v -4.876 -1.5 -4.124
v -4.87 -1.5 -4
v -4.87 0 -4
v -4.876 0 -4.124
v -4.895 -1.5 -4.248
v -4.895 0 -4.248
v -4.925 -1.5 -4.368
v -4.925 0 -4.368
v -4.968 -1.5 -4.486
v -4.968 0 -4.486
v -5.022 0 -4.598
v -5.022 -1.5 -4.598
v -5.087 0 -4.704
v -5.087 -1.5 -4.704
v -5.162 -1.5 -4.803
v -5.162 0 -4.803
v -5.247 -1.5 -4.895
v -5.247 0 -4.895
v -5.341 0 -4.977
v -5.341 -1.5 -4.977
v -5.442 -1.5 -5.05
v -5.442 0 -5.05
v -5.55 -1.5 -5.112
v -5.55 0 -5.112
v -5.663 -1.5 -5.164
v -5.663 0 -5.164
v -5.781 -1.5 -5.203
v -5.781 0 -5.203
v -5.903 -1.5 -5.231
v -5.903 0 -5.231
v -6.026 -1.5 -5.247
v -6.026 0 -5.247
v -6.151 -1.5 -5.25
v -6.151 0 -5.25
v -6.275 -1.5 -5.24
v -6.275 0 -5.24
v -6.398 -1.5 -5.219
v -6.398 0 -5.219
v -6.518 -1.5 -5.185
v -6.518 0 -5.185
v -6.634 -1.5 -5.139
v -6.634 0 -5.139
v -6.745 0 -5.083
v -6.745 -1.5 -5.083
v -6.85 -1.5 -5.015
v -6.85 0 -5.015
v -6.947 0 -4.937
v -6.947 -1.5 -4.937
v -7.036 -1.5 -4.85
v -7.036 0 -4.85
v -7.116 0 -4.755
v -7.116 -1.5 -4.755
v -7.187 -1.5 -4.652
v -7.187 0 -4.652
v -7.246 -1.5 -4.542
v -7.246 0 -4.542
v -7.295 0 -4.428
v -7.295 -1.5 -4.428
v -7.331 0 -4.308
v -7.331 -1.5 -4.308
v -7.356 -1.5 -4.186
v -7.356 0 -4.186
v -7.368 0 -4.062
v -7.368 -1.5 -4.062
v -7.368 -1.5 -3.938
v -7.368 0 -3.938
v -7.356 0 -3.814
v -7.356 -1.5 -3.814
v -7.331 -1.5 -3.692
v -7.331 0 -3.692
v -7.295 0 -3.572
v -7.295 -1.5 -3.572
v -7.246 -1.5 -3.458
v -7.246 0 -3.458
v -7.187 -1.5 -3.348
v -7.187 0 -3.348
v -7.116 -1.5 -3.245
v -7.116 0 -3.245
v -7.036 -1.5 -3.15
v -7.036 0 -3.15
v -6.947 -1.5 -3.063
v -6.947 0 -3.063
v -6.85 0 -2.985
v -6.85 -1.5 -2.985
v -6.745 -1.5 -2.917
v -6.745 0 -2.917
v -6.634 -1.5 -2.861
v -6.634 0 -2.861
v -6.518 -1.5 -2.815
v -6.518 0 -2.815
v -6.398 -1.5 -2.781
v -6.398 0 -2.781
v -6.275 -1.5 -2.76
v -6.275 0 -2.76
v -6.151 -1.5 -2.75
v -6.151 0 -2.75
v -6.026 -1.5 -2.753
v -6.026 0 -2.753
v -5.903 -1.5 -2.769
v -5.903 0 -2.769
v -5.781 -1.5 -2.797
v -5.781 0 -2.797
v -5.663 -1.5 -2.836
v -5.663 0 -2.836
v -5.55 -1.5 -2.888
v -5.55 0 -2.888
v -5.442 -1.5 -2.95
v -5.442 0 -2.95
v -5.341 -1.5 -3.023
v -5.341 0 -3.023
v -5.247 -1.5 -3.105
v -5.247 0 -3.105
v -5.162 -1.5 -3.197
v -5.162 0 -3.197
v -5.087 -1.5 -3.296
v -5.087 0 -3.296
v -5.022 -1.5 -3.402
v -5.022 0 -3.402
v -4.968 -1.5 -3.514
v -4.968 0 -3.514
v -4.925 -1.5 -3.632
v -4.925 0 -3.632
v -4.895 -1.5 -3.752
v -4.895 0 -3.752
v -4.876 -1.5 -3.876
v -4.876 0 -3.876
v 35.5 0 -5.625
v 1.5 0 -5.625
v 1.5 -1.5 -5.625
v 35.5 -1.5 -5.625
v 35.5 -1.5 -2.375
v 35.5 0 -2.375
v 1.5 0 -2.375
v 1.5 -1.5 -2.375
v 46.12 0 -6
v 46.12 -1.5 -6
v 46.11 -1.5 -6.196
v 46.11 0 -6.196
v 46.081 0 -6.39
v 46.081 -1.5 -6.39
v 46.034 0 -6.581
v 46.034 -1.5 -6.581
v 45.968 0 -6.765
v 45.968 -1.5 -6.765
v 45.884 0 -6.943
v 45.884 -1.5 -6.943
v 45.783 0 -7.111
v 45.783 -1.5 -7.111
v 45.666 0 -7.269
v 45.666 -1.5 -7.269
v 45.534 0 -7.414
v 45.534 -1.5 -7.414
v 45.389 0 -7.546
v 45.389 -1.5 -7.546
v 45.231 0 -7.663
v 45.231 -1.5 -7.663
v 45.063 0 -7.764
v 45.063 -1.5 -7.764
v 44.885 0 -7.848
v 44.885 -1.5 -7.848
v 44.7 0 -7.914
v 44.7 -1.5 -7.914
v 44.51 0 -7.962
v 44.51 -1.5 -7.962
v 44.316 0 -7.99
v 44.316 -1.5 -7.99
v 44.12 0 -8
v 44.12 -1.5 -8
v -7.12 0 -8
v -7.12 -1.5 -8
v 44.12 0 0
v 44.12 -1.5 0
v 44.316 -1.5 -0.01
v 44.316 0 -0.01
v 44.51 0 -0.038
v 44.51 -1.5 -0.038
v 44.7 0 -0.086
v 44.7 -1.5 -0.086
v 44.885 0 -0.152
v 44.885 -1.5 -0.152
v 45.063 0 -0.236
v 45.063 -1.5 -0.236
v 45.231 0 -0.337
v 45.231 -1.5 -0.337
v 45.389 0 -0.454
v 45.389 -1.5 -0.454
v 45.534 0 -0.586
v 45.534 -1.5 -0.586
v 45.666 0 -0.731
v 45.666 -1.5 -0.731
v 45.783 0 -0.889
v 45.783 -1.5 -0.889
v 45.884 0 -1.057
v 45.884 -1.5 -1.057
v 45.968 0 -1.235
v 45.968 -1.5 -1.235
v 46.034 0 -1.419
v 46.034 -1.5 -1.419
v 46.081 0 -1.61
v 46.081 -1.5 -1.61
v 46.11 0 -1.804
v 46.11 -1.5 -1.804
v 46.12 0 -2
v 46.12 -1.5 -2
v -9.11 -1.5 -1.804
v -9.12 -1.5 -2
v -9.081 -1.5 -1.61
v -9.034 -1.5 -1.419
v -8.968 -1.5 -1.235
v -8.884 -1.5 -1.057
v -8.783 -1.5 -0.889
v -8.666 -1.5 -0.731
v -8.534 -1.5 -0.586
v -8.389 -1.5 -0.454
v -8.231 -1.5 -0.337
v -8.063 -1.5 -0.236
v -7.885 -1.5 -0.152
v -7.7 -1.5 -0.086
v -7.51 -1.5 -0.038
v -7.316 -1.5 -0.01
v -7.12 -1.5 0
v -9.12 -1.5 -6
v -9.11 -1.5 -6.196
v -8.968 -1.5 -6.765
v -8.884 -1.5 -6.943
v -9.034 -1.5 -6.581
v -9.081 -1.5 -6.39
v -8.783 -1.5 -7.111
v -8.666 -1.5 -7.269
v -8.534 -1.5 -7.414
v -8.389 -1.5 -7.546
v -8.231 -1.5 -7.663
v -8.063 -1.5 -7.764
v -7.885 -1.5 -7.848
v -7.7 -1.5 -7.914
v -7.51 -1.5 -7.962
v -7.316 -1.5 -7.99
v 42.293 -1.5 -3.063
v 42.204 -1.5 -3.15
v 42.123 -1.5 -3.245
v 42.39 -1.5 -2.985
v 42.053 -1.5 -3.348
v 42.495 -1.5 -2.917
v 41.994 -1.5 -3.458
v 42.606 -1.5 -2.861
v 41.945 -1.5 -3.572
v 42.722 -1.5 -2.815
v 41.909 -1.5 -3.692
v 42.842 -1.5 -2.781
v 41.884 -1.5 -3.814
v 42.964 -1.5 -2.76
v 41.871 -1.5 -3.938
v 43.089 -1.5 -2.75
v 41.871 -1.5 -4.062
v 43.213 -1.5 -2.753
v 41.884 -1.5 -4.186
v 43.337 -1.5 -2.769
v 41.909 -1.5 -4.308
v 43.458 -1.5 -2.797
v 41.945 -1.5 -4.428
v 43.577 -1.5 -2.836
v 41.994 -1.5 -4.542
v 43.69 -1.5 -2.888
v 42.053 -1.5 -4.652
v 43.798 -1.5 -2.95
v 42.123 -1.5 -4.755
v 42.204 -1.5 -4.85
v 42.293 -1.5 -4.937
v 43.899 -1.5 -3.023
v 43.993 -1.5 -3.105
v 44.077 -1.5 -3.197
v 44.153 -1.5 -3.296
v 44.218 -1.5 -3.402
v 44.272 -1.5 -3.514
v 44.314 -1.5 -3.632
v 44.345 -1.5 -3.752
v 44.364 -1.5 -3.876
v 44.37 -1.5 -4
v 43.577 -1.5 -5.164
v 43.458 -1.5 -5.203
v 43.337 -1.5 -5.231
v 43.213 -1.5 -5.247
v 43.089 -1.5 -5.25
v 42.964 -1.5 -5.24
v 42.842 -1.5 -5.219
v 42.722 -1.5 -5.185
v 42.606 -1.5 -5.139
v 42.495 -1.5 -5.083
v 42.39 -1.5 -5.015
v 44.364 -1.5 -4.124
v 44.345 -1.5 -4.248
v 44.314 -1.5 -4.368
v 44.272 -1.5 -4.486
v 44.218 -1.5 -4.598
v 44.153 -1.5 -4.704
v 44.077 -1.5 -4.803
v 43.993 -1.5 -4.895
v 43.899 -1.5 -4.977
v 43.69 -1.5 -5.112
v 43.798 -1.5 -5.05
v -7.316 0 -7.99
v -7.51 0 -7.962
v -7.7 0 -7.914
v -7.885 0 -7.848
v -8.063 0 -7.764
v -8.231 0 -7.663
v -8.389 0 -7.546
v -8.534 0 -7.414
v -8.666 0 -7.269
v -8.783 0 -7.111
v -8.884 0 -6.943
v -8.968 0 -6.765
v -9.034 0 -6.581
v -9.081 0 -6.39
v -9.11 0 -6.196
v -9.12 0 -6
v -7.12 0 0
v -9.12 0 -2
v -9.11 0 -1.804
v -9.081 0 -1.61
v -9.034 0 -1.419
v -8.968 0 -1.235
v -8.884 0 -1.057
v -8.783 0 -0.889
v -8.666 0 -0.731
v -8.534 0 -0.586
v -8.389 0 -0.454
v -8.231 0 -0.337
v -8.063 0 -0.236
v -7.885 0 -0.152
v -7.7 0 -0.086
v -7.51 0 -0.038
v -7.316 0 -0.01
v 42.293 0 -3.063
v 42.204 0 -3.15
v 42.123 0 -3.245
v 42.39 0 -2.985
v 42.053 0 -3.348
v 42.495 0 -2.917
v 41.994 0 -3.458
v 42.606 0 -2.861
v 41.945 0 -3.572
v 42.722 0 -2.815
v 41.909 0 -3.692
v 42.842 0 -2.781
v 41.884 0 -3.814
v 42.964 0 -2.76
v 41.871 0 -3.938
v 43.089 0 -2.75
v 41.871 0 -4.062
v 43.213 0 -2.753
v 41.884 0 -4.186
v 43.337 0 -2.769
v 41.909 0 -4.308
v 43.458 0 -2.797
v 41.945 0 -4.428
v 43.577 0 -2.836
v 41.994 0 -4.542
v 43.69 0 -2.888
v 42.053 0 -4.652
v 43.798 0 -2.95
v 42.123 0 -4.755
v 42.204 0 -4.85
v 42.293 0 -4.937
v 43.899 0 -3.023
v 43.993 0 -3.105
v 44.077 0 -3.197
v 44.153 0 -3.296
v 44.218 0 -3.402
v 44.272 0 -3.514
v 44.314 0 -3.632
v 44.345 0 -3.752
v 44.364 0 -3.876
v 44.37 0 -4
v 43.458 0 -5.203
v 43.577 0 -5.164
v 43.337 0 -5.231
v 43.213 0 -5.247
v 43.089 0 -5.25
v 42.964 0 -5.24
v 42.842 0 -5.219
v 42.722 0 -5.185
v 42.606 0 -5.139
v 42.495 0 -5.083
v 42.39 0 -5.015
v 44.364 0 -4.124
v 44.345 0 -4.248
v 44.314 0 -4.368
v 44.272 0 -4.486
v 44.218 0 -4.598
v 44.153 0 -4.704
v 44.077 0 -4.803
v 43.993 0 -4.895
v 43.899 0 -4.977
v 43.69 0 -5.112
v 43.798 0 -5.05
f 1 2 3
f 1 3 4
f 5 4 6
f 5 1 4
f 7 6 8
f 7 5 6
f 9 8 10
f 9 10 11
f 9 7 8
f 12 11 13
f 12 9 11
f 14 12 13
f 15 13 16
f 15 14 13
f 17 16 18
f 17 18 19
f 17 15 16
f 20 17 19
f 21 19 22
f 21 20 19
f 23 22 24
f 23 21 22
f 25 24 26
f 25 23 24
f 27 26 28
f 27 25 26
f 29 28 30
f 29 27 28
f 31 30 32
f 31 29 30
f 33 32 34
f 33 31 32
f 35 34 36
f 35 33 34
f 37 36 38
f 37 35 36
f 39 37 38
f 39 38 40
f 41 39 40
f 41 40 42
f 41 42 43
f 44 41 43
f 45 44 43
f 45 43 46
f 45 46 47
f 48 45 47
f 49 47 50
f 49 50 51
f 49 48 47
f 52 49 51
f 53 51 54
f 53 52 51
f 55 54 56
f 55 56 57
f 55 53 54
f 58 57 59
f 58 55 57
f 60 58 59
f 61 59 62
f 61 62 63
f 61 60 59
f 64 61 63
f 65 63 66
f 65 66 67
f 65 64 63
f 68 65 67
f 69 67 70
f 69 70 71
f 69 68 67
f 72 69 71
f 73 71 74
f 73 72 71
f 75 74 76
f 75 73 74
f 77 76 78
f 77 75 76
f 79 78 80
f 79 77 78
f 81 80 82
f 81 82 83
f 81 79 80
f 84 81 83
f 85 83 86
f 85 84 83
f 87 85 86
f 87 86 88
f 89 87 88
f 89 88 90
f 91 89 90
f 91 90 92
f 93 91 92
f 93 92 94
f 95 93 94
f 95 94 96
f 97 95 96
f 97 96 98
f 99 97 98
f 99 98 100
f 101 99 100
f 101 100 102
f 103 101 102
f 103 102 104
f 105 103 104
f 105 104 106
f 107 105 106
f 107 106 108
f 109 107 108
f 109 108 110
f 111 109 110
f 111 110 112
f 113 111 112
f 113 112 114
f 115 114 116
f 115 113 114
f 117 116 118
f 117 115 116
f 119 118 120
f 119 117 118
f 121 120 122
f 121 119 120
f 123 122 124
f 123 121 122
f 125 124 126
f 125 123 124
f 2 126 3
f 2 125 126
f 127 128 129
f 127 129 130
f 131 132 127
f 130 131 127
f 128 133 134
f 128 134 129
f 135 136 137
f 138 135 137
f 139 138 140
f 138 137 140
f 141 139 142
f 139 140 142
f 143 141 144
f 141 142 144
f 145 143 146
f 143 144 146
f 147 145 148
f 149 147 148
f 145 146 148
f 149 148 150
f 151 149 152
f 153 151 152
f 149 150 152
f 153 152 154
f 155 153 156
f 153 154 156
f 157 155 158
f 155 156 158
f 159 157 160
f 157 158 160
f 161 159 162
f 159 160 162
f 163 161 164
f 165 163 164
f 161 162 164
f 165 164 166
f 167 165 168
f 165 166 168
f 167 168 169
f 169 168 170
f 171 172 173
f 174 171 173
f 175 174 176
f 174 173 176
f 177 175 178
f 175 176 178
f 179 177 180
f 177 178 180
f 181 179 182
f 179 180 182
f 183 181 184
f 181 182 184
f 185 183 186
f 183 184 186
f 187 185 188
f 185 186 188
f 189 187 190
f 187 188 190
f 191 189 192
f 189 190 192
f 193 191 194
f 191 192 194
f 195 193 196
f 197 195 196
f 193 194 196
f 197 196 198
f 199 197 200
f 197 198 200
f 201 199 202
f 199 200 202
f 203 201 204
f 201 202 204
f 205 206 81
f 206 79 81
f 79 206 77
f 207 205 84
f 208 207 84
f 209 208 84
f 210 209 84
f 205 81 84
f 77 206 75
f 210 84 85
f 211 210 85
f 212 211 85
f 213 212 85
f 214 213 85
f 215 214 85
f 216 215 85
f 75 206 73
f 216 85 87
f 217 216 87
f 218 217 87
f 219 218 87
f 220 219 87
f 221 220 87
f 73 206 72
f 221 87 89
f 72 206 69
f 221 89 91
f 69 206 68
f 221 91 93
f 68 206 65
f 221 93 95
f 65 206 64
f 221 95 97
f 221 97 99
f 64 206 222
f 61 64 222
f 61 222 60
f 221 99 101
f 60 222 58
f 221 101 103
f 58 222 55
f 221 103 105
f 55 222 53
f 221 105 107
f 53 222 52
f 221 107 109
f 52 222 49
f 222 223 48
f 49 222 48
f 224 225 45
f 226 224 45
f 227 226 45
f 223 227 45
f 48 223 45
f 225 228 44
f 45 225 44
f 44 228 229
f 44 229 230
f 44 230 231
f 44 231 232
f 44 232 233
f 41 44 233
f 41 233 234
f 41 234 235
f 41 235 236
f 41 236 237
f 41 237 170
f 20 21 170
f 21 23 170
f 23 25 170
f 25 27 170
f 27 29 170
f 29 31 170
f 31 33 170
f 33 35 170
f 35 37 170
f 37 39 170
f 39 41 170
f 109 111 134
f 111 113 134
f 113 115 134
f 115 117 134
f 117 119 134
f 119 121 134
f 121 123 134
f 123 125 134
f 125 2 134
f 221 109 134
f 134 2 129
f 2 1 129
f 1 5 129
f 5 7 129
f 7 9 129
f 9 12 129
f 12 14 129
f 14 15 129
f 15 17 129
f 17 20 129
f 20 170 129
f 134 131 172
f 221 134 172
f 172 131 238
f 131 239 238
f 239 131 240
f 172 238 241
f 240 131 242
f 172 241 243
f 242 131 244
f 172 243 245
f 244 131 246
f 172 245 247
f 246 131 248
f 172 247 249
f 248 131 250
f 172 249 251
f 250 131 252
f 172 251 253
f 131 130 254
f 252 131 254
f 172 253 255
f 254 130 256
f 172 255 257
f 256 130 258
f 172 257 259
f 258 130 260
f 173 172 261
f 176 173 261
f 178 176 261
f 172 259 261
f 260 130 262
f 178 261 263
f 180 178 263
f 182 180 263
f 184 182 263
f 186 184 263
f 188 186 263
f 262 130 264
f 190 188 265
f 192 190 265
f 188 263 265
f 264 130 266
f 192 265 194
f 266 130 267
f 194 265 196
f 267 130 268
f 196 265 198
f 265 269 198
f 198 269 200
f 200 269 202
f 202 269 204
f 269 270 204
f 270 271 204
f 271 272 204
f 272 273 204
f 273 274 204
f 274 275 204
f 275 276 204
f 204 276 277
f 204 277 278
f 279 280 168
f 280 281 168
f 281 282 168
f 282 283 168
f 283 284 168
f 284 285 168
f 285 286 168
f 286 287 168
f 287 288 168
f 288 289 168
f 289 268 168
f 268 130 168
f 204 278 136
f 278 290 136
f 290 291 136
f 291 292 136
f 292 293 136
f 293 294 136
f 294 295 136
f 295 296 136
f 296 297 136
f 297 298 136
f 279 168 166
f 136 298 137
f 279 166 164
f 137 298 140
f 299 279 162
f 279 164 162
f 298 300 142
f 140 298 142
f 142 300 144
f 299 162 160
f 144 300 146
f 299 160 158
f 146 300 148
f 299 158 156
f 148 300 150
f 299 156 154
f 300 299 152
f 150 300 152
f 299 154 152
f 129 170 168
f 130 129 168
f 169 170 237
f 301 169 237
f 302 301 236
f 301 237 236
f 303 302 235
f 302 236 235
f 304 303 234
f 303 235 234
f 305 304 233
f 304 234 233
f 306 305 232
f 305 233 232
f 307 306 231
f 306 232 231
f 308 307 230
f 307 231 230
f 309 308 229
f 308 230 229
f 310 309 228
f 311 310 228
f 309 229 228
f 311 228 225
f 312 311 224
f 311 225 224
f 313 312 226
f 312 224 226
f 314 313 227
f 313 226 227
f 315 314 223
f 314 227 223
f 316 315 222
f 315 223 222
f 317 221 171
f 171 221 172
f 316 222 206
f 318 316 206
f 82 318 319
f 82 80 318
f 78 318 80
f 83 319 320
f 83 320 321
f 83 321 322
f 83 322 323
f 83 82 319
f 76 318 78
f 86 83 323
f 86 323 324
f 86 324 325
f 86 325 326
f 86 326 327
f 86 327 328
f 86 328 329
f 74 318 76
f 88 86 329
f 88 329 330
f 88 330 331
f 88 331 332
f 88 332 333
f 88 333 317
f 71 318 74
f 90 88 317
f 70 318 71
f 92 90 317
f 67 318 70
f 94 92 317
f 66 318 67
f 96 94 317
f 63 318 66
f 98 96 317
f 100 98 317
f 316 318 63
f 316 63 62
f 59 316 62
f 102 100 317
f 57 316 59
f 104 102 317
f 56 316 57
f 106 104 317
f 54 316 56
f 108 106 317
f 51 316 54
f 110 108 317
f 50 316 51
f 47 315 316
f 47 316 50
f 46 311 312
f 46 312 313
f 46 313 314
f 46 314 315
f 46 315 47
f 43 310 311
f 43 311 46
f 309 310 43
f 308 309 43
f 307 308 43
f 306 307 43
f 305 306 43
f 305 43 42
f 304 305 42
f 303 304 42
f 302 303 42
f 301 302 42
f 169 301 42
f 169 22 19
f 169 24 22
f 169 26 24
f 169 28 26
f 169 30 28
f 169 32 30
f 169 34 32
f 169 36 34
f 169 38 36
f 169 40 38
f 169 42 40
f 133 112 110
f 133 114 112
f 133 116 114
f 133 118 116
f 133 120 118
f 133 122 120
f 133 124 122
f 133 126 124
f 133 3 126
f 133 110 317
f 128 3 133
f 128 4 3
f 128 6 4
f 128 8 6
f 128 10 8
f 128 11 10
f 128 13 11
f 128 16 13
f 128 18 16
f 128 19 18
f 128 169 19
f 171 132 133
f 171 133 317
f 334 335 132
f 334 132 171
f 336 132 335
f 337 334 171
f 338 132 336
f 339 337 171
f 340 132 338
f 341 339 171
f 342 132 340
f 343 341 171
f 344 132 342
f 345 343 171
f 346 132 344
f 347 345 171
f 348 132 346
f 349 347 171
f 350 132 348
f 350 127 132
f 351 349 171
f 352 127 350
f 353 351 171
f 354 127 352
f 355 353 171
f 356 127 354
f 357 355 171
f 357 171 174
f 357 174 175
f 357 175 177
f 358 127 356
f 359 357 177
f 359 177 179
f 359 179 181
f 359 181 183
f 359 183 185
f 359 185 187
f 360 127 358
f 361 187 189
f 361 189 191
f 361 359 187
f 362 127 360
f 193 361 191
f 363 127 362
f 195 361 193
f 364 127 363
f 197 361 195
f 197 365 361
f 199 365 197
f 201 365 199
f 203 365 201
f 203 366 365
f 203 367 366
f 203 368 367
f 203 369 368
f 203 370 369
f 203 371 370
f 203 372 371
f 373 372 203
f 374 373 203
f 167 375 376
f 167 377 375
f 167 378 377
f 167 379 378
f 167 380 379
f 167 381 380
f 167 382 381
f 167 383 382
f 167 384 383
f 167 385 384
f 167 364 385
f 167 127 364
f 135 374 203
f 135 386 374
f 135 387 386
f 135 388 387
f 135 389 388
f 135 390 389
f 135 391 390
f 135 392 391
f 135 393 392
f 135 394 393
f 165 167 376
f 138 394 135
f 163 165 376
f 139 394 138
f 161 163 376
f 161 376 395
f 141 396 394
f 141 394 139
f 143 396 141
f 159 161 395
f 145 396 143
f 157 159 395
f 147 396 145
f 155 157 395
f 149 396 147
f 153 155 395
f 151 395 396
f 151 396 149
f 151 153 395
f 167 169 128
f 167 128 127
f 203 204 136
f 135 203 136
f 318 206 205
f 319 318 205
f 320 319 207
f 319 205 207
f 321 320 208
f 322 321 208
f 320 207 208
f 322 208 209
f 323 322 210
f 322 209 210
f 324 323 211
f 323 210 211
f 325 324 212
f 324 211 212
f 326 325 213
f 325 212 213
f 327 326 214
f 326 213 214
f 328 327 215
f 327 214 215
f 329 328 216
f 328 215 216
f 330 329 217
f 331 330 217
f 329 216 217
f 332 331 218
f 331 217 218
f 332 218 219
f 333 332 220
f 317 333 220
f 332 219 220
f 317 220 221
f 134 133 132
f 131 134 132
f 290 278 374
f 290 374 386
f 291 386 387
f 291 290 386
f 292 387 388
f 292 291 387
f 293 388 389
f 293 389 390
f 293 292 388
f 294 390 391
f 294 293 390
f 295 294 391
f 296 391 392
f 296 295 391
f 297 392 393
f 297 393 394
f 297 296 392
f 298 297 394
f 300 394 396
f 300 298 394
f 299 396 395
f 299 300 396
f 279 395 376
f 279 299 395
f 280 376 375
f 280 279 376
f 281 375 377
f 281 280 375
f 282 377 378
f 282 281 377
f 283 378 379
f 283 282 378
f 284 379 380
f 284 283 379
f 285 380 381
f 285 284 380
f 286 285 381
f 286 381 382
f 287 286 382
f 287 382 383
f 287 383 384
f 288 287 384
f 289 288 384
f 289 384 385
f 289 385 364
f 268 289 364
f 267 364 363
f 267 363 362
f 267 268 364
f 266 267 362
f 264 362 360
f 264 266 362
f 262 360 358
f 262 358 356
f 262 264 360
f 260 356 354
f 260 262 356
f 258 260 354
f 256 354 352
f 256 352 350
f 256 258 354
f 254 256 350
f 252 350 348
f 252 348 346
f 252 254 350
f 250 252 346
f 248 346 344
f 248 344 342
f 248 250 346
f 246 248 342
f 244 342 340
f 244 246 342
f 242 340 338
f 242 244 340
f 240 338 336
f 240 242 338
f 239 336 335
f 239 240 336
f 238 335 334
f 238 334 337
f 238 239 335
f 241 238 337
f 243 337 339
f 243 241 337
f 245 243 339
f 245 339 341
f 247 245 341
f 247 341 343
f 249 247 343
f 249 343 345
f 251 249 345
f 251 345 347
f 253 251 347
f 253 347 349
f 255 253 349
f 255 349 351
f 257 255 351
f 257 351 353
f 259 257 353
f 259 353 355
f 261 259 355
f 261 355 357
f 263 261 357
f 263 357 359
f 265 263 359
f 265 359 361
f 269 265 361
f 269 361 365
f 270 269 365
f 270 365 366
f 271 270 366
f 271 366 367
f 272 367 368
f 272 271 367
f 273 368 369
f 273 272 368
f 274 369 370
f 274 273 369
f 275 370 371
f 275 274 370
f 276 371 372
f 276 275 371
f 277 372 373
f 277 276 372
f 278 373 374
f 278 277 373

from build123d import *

# Parameters (mm, degrees)
SKETCH1_W                   = 37
SKETCH1_H                   = 8
SKETCH1_W_2                 = 34
SKETCH1_H_2                 = 3.25
BASE_FLANGE1_DEPTH          = 1.5
EDGE_FLANGE1_DEPTH          = 8
EDGE_FLANGE1_BEND_DEPTH     = 8
TAP_DRILL_FOR_M3X0_5_TAP1_D = 2.5
FILLET1_START               = -8.5
FILLET1_OUTLINE_W           = 43.3
FILLET1_OUTLINE_H           = 8
FILLET1_OUTLINE_W_2         = 34
FILLET1_OUTLINE_H_2         = 3.25
FILLET1_DEPTH               = 7
FILLET1_START_2             = -1.5
FILLET1_2_OUTLINE_R         = 1.25
FILLET1_2_OUTLINE_W         = 34
FILLET1_2_OUTLINE_H         = 3.25
FILLET1_2_DEPTH             = 1.5


with BuildPart() as part:
    # Base-Flange1: sheet metal written as solids
    # Sketch1 → Base-Flange1 (new body)
    with BuildSketch(Plane(origin=(0, 0, 0), x_dir=(1, 0, 0), z_dir=(0, 1, 0))):
        with Locations((18.5, 4)):
            Rectangle(SKETCH1_W, SKETCH1_H)
        with Locations((18.5, 4)):
            Rectangle(SKETCH1_W_2, SKETCH1_H_2, mode=Mode.SUBTRACT)
    extrude(amount=-BASE_FLANGE1_DEPTH)

    # Edge-Flange1: sheet metal written as solids
    # Edge-Flange1 section (on a plane across the edge) → Edge-Flange1 (add)
    with BuildSketch(Plane(origin=(-1.65, -1.5, 0), x_dir=(1, 0, 0), z_dir=(0, 0, -1))):
        with BuildLine():
            Line((-1.5, 1.65), (-1.5, 7))
            Line((-1.5, 7), (0, 7))
            Line((0, 7), (0, 1.65))
            ThreePointArc((0, 1.65), (0.483273811, 0.483273811), (1.65, 0))
            Line((1.65, 0), (1.65, -1.5))
            ThreePointArc((1.65, -1.5), (-0.577386361, -0.577386361), (-1.5, 1.65))
        make_face()
    extrude(amount=EDGE_FLANGE1_DEPTH)

    # Edge-Flange1 section 2 (on a plane across the edge) → Edge-Flange1 bend (add)
    with BuildSketch(Plane(origin=(38.65, -1.5, -8), x_dir=(-1, 0, 0), z_dir=(0, 0, 1))):
        with BuildLine():
            Line((-1.5, 1.65), (-1.5, 7))
            Line((-1.5, 7), (0, 7))
            Line((0, 7), (0, 1.65))
            ThreePointArc((0, 1.65), (0.483273811, 0.483273811), (1.65, 0))
            Line((1.65, 0), (1.65, -1.5))
            ThreePointArc((1.65, -1.5), (-0.577386361, -0.577386361), (-1.5, 1.65))
        make_face()
    extrude(amount=EDGE_FLANGE1_BEND_DEPTH)

    # Tap Drill for M3x0.5 Tap1 (through all)
    with Locations(Plane(origin=(40.15, 0, 0), x_dir=(0, 0, -1), z_dir=(1, 0, 0))):
        with Locations((4, -5.5)):
            Hole(TAP_DRILL_FOR_M3X0_5_TAP1_D / 2)

    # Fillet1: read off the stored shape, not the designer's step
    # Fillet1 outline → Fillet1 (cut)
    with BuildSketch(Plane(origin=(0, 0, 0), x_dir=(1, 0, 0), z_dir=(0, 1, 0)).offset(FILLET1_START)):
        with Locations((18.5, 4)):
            Rectangle(FILLET1_OUTLINE_W, FILLET1_OUTLINE_H)
        with Locations((18.5, 4)):
            Rectangle(FILLET1_OUTLINE_W_2, FILLET1_OUTLINE_H_2, mode=Mode.SUBTRACT)
    extrude(amount=FILLET1_DEPTH, mode=Mode.SUBTRACT)

    # Fillet1 2 outline → Fillet1 2 (add)
    with BuildSketch(Plane(origin=(0, 0, 0), x_dir=(1, 0, 0), z_dir=(0, 1, 0)).offset(FILLET1_START_2)):
        with BuildLine():
            Line((-9.119911184, 6), (-9.119911184, 2))
            ThreePointArc((-9.119911184, 2), (-8.534124747, 0.585786438), (-7.119911184, 0))
            Line((-7.119911184, 0), (44.119911184, 0))
            ThreePointArc((44.119911184, 0), (45.534124747, 0.585786438), (46.119911184, 2))
            Line((46.119911184, 2), (46.119911184, 6))
            ThreePointArc((46.119911184, 6), (45.534124747, 7.414213562), (44.119911184, 8))
            Line((44.119911184, 8), (-7.119911184, 8))
            ThreePointArc((-7.119911184, 8), (-8.534124747, 7.414213562), (-9.119911184, 6))
        make_face()
        with Locations((-6.119911184, 4)):
            Circle(FILLET1_2_OUTLINE_R, mode=Mode.SUBTRACT)
        with Locations((18.5, 4)):
            Rectangle(FILLET1_2_OUTLINE_W, FILLET1_2_OUTLINE_H, mode=Mode.SUBTRACT)
        with Locations((43.119911184, 4)):
            Circle(FILLET1_2_OUTLINE_R, mode=Mode.SUBTRACT)
    extrude(amount=FILLET1_2_DEPTH)


solid = part.part
